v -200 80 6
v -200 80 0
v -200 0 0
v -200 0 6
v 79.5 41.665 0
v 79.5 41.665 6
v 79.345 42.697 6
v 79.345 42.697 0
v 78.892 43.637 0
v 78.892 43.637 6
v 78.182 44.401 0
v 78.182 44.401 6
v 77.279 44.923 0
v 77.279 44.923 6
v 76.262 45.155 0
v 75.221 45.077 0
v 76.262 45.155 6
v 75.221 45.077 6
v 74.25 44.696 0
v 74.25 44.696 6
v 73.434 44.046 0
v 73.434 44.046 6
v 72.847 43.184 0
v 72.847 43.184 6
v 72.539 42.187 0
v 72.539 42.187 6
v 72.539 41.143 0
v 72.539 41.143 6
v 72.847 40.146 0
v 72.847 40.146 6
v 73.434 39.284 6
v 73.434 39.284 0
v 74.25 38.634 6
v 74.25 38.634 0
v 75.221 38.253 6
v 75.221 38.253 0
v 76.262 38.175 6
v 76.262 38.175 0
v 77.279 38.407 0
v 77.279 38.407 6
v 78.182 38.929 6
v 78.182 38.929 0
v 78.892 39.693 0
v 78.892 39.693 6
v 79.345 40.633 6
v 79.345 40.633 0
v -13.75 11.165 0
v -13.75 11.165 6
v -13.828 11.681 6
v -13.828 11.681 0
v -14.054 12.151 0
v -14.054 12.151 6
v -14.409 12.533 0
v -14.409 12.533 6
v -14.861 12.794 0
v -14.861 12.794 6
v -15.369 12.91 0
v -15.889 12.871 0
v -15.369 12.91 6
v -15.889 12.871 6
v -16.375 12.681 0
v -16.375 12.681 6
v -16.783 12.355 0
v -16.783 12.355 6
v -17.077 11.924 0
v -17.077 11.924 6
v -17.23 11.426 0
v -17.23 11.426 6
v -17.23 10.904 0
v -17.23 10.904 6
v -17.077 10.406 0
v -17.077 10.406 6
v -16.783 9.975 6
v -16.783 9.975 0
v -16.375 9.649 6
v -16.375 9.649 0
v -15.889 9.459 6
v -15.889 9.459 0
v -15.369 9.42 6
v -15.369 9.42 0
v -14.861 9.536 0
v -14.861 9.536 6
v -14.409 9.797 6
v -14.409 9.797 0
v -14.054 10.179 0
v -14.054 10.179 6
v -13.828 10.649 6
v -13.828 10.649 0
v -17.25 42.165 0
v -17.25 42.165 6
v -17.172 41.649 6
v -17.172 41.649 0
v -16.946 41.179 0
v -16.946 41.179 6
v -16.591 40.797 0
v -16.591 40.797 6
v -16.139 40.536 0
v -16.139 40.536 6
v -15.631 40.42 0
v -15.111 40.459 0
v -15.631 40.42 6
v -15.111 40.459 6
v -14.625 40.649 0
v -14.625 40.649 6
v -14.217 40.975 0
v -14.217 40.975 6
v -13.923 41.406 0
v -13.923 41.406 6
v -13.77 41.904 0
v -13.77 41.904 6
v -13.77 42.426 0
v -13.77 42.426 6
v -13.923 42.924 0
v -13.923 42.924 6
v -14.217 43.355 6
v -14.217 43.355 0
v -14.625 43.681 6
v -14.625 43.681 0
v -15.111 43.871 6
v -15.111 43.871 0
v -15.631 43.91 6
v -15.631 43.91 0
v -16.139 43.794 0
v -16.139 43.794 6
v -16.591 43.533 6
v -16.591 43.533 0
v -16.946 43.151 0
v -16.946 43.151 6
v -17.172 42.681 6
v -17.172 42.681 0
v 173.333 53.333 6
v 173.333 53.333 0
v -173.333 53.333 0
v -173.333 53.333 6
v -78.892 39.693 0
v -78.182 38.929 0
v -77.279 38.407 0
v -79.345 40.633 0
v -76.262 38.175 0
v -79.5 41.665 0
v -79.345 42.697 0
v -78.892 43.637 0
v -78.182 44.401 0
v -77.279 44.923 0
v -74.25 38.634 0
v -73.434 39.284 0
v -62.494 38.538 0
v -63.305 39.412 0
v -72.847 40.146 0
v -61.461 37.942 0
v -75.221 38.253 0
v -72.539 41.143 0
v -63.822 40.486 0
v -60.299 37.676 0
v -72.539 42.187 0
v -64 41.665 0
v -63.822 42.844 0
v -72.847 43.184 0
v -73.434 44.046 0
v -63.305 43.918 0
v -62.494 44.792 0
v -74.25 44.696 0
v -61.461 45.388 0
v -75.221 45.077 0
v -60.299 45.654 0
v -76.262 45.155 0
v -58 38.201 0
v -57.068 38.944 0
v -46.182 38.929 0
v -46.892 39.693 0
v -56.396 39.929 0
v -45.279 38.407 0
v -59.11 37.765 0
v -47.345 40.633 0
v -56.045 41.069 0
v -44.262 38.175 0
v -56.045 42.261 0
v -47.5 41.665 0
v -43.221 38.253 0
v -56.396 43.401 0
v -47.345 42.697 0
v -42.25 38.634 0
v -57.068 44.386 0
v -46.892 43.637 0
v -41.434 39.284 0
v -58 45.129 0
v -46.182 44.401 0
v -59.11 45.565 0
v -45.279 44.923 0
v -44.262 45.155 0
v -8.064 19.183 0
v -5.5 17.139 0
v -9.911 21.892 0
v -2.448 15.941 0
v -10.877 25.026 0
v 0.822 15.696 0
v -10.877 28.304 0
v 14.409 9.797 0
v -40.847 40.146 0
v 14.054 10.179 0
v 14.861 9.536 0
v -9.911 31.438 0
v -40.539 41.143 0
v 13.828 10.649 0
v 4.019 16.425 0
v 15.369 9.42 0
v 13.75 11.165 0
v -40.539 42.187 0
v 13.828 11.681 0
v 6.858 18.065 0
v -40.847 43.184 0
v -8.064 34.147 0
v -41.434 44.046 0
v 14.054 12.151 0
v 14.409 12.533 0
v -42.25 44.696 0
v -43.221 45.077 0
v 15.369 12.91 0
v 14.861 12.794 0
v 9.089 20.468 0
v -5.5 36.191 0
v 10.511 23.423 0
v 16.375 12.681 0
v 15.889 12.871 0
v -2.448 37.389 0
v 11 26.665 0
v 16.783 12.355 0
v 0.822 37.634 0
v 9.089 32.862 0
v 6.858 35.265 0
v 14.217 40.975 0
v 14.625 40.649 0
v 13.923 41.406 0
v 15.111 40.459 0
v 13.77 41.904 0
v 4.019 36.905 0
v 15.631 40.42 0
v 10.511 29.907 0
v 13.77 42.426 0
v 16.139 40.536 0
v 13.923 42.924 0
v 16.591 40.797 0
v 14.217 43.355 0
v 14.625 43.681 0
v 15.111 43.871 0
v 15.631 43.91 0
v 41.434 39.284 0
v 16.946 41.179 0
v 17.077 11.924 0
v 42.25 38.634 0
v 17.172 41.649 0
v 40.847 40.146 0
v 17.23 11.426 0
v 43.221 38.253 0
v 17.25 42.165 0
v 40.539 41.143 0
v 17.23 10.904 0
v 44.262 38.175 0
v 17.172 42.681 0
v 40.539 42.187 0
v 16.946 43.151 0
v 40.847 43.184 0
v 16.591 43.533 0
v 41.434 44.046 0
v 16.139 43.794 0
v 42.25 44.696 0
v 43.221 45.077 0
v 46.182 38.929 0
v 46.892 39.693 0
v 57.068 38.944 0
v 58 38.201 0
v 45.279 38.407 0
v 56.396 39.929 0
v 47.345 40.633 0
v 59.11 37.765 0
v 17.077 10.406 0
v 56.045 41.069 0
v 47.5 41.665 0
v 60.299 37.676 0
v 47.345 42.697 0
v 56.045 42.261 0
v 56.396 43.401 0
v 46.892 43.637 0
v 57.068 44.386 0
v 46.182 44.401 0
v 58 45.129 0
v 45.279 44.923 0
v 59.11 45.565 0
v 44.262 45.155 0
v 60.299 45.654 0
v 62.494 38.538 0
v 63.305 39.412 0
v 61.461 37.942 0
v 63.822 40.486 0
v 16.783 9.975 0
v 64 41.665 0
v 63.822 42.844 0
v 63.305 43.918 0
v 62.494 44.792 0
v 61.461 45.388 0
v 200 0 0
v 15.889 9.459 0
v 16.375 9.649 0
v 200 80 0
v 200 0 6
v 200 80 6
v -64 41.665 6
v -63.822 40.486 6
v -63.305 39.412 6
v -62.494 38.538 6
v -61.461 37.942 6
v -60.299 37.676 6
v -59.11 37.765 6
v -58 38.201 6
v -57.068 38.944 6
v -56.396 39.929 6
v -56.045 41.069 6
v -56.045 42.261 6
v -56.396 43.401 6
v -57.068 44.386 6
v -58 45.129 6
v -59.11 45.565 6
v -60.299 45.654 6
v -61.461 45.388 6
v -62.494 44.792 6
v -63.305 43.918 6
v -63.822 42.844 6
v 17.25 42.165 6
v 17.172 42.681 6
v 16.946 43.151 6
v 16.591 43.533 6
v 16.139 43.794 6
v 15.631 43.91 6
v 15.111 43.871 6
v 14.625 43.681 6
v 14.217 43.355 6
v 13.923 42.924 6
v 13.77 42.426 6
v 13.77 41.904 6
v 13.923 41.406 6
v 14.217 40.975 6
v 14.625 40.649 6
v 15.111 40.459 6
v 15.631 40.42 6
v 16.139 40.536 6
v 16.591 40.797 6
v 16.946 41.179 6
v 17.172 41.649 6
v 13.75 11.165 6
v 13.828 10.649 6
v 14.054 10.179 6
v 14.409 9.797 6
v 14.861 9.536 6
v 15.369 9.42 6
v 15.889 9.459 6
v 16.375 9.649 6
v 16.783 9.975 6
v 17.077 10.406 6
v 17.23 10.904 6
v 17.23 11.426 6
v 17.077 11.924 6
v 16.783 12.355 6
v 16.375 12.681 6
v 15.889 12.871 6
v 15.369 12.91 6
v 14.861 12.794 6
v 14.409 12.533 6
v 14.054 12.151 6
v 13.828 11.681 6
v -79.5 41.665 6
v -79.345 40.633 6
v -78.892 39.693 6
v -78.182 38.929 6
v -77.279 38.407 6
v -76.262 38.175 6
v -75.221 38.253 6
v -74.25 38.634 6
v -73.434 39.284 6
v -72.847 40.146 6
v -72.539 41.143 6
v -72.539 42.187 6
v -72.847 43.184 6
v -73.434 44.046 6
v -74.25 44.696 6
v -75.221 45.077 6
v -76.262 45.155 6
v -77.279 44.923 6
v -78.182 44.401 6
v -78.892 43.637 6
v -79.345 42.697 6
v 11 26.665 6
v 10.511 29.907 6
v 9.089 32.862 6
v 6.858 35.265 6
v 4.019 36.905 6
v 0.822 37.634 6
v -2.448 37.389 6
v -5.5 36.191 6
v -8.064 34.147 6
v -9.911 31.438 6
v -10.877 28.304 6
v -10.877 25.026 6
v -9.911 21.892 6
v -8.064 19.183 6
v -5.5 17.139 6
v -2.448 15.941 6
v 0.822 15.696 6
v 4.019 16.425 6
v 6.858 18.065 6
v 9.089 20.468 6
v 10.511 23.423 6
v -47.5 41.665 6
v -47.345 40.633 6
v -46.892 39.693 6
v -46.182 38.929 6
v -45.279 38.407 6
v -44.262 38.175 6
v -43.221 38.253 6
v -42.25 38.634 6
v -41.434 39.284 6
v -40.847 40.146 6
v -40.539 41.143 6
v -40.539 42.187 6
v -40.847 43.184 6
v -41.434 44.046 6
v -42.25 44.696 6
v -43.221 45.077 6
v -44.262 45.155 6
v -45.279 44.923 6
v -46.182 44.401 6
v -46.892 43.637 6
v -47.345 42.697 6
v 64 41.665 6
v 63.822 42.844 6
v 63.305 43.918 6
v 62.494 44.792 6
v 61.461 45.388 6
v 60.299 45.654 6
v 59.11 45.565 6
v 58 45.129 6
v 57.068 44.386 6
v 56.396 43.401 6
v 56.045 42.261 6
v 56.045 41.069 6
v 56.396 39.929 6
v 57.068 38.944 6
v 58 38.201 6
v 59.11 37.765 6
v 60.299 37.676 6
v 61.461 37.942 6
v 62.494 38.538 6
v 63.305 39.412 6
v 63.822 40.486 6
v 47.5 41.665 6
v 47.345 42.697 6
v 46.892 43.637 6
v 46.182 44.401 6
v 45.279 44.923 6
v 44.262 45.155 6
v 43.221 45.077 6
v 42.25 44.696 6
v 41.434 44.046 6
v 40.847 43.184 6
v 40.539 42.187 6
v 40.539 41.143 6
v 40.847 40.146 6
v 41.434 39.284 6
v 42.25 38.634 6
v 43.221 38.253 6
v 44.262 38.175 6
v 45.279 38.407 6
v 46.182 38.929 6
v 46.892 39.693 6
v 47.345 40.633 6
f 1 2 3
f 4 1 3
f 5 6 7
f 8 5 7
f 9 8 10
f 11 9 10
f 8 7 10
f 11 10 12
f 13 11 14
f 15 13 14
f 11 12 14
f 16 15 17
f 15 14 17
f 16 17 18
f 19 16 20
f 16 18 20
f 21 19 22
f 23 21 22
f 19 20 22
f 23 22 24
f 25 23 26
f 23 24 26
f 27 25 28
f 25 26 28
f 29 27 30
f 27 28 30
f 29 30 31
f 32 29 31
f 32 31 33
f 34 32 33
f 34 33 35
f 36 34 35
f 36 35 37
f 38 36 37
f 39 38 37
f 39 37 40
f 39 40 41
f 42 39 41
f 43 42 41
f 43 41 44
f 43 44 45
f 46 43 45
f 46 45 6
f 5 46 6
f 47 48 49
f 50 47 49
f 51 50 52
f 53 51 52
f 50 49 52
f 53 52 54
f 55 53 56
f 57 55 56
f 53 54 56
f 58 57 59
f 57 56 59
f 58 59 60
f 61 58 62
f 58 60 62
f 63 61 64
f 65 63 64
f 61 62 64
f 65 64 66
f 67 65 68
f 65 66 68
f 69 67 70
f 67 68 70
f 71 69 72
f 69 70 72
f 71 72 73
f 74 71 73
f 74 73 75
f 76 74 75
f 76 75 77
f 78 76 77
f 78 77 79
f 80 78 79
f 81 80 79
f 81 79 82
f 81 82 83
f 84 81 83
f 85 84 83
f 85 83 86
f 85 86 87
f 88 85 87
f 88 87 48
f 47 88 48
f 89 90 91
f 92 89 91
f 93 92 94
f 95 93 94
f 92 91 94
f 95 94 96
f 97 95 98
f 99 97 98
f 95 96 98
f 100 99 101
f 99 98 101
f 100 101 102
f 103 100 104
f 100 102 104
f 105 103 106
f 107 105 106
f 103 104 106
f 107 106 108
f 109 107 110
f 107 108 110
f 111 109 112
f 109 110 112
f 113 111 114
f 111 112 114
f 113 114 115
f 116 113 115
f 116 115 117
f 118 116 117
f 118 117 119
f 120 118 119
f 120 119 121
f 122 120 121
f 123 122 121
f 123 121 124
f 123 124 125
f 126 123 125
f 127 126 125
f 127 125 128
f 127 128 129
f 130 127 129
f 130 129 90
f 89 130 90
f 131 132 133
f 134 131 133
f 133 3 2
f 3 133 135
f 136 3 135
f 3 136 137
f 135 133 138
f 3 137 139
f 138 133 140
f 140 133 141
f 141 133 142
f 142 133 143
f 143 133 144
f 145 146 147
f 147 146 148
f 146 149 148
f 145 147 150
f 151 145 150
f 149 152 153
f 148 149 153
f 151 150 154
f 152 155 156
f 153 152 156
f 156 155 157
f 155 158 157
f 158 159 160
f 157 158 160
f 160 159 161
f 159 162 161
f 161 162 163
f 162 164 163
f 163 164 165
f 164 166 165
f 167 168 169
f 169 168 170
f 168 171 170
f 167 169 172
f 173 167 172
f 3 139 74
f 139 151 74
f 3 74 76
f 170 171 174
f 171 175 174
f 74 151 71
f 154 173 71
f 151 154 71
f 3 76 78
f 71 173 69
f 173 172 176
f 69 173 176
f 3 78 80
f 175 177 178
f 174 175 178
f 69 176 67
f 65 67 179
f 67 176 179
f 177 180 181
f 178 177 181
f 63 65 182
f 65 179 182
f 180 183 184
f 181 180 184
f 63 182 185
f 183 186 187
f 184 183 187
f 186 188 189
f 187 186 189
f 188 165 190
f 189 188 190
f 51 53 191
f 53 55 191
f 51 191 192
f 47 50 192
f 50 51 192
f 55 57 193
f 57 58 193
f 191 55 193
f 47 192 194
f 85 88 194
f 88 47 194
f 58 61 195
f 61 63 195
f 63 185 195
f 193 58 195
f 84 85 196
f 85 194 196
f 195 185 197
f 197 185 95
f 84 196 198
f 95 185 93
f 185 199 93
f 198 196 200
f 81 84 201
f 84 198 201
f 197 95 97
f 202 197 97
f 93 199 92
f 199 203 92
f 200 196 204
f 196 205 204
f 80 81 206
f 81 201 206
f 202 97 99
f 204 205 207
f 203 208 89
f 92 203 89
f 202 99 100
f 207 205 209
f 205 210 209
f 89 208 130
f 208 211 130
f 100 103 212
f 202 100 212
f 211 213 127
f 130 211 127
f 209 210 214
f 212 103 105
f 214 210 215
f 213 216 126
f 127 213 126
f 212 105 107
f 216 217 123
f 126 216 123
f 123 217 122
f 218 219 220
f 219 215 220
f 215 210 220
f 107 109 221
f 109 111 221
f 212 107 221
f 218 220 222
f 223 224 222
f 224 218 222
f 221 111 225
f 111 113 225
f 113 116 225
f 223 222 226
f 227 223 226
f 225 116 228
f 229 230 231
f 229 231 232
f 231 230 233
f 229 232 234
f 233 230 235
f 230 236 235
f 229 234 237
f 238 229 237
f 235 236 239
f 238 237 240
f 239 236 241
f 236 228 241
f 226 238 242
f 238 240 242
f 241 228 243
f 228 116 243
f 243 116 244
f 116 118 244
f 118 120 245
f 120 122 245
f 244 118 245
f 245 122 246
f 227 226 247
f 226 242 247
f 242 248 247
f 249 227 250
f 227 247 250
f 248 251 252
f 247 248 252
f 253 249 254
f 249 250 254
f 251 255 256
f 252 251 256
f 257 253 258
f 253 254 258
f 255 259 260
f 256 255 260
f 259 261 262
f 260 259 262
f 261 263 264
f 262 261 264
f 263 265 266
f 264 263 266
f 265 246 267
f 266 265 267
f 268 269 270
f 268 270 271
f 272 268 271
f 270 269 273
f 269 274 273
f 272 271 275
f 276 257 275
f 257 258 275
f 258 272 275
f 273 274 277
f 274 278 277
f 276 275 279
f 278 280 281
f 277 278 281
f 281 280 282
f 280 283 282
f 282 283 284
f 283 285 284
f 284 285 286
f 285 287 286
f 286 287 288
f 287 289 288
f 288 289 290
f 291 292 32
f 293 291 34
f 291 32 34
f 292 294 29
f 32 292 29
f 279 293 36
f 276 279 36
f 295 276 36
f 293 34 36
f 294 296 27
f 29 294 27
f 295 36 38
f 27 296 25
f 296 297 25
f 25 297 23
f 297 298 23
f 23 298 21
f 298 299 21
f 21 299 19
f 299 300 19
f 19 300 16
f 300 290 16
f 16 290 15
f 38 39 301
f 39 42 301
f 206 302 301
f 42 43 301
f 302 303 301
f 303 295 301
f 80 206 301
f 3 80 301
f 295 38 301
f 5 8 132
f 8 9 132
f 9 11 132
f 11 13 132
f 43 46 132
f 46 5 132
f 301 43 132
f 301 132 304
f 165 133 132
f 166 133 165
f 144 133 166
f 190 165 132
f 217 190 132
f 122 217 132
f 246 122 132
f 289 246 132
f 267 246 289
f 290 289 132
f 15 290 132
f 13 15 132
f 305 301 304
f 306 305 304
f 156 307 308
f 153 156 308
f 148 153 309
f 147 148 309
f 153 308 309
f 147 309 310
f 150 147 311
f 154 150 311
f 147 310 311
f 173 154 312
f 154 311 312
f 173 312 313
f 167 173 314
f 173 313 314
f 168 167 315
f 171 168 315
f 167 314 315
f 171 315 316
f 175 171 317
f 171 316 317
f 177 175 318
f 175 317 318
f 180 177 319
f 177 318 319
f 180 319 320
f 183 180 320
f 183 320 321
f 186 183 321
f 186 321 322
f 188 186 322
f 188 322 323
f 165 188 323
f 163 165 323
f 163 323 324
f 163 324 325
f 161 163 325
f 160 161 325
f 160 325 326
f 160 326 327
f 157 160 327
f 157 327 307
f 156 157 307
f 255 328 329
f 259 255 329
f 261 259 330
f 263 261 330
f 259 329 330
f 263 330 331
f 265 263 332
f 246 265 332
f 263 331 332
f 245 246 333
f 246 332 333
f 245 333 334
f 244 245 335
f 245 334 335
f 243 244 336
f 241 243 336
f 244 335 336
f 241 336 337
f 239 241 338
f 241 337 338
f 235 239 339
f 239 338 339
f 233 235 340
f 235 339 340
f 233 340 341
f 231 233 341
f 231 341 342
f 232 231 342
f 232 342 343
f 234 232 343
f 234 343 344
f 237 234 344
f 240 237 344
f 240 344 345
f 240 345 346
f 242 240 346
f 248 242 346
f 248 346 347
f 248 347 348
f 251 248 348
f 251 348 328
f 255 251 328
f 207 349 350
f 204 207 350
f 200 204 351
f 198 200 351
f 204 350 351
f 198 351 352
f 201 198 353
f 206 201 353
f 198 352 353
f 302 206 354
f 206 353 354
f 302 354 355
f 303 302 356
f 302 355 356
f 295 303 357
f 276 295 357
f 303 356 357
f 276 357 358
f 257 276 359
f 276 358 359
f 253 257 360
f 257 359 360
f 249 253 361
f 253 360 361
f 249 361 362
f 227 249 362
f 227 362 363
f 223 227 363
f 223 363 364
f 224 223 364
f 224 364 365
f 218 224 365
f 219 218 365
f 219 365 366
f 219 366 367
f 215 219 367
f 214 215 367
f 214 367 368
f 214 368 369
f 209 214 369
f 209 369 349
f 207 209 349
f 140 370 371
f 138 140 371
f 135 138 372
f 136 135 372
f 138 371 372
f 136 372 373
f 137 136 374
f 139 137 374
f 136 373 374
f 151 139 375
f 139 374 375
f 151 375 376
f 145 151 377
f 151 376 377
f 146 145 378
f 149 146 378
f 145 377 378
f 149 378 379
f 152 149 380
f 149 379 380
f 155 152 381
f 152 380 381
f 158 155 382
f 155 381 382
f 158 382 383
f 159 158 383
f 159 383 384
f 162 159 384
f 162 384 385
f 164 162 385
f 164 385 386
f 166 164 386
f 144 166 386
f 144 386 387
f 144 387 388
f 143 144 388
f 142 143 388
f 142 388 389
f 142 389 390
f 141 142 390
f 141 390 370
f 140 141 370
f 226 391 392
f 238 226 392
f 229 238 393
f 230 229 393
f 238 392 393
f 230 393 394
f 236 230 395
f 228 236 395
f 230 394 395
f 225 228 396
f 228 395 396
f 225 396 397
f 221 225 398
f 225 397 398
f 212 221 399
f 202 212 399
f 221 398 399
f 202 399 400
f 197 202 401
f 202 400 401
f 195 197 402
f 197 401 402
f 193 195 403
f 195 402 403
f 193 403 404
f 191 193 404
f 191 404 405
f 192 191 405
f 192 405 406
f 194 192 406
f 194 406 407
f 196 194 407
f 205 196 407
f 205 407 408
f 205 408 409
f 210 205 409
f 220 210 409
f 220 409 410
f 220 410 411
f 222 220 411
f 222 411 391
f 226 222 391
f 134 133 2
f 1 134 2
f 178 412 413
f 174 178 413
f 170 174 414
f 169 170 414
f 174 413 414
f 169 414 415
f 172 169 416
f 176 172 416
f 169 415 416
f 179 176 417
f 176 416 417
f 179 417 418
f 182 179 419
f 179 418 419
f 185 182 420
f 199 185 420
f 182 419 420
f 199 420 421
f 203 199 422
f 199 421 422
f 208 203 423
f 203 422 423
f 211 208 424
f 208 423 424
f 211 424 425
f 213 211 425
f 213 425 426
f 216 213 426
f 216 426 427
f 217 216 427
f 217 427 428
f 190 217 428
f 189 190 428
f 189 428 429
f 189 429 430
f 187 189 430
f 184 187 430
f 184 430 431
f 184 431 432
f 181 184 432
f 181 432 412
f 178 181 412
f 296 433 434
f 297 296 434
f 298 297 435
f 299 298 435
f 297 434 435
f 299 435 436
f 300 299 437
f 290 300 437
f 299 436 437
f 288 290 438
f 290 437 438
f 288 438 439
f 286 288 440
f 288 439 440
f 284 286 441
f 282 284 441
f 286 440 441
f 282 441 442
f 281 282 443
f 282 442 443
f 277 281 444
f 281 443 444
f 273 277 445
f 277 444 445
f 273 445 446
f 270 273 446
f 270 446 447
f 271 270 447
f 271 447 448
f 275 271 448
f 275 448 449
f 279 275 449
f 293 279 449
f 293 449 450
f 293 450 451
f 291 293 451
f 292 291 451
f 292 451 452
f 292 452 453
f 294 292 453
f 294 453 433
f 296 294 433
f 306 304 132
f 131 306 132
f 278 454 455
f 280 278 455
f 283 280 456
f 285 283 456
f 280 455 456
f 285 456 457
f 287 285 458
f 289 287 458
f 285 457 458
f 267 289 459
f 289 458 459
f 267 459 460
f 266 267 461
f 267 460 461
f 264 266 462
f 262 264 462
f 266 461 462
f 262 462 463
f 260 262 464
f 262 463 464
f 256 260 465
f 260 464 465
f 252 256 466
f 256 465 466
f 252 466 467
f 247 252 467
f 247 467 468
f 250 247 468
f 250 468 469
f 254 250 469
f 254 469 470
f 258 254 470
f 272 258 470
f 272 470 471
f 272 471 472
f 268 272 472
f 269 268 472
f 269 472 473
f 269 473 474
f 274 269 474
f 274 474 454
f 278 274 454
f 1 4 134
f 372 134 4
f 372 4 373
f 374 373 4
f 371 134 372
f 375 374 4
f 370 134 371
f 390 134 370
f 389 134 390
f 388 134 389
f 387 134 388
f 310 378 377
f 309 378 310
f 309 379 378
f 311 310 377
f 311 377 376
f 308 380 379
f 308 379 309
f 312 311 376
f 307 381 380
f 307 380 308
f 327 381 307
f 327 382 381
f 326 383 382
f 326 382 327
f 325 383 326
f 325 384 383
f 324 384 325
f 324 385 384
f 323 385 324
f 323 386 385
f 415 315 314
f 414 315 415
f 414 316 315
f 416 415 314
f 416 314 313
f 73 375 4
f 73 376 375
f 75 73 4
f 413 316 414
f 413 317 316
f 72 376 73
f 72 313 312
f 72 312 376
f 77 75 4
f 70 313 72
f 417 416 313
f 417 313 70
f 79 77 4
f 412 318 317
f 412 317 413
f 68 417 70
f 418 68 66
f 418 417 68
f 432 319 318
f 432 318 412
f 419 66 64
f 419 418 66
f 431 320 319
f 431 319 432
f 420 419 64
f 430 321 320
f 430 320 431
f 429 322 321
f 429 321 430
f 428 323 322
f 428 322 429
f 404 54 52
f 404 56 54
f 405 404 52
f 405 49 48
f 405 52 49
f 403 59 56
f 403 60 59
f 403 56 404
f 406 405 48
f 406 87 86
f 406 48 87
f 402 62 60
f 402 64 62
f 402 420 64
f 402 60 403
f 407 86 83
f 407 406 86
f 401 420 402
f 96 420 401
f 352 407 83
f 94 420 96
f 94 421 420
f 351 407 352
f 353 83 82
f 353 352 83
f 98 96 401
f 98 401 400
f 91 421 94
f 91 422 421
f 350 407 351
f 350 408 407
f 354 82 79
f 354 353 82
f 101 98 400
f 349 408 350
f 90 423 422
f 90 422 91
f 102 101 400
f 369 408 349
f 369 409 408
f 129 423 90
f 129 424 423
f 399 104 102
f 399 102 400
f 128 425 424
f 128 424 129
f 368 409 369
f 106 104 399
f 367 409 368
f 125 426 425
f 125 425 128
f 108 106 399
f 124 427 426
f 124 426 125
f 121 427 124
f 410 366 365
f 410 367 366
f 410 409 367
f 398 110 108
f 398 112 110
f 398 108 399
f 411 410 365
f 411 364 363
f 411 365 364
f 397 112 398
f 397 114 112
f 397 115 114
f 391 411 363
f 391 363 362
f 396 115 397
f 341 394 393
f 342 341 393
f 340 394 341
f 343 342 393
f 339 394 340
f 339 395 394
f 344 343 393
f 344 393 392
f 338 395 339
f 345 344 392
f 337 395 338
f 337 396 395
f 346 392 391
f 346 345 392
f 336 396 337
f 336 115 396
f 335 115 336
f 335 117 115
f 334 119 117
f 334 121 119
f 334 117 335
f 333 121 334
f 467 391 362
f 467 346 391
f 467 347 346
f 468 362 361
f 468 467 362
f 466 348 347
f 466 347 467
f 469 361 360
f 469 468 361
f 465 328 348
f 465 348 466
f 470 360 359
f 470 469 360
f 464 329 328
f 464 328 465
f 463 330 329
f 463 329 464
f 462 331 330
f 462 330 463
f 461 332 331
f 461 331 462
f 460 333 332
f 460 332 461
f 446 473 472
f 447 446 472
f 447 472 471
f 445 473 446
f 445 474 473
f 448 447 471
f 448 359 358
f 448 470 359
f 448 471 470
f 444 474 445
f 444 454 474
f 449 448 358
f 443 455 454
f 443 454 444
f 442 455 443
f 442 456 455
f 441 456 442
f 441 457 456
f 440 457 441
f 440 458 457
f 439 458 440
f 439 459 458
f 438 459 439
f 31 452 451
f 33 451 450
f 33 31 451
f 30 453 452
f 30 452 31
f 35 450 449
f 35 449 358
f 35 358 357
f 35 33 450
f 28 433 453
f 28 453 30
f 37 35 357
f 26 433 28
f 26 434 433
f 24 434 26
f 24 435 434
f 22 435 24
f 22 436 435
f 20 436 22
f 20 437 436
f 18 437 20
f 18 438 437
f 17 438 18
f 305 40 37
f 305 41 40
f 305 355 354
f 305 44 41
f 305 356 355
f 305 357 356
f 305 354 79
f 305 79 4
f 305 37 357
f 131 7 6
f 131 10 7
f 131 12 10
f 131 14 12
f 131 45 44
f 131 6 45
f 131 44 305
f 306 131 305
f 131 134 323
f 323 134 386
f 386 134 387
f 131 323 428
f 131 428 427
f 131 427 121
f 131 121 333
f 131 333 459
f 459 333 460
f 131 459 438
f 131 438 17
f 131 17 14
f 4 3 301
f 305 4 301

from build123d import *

# Parameters (mm, degrees)
BOSS_EXTRUDE1_DEPTH = 6
SKETCH2_R           = 11
SKETCH2_R_2         = 1.75
SKETCH2_R_3         = 4
SKETCH2_R_4         = 3.5
CUT_EXTRUDE1_DEPTH  = 216.490138986


with BuildPart() as part:
    # Sketch1 → Boss-Extrude1 (new body)
    with BuildSketch(Plane.XY):
        Polygon((-200, 0), (200, 0), (200, 80), (173.333333333, 53.333333333), (-173.333333333, 53.333333333), (-200, 80), align=None)
    extrude(amount=BOSS_EXTRUDE1_DEPTH)

    # Sketch2 → Cut-Extrude1 (cut, through all)
    with BuildSketch(Plane.XY.offset(6)):
        with Locations((0, 26.665)):
            Circle(SKETCH2_R)
        with Locations((15.5, 42.165)):
            Circle(SKETCH2_R_2)
        with Locations(Location((-15.5, 42.165, 0), (0, 0, 180))):
            Circle(SKETCH2_R_2)
        with Locations((-15.5, 11.165)):
            Circle(SKETCH2_R_2)
        with Locations(Location((15.5, 11.165, 0), (0, 0, 180))):
            Circle(SKETCH2_R_2)
        with Locations((60, 41.665)):
            Circle(SKETCH2_R_3)
        with Locations((76, 41.665)):
            Circle(SKETCH2_R_4)
        with Locations((44, 41.665)):
            Circle(SKETCH2_R_4)
        with Locations(Location((-44, 41.665, 0), (0, 0, 180))):
            Circle(SKETCH2_R_4)
        with Locations(Location((-76, 41.665, 0), (0, 0, 180))):
            Circle(SKETCH2_R_4)
        with Locations(Location((-60, 41.665, 0), (0, 0, 180))):
            Circle(SKETCH2_R_3)
    extrude(amount=-CUT_EXTRUDE1_DEPTH, mode=Mode.SUBTRACT)


solid = part.part
